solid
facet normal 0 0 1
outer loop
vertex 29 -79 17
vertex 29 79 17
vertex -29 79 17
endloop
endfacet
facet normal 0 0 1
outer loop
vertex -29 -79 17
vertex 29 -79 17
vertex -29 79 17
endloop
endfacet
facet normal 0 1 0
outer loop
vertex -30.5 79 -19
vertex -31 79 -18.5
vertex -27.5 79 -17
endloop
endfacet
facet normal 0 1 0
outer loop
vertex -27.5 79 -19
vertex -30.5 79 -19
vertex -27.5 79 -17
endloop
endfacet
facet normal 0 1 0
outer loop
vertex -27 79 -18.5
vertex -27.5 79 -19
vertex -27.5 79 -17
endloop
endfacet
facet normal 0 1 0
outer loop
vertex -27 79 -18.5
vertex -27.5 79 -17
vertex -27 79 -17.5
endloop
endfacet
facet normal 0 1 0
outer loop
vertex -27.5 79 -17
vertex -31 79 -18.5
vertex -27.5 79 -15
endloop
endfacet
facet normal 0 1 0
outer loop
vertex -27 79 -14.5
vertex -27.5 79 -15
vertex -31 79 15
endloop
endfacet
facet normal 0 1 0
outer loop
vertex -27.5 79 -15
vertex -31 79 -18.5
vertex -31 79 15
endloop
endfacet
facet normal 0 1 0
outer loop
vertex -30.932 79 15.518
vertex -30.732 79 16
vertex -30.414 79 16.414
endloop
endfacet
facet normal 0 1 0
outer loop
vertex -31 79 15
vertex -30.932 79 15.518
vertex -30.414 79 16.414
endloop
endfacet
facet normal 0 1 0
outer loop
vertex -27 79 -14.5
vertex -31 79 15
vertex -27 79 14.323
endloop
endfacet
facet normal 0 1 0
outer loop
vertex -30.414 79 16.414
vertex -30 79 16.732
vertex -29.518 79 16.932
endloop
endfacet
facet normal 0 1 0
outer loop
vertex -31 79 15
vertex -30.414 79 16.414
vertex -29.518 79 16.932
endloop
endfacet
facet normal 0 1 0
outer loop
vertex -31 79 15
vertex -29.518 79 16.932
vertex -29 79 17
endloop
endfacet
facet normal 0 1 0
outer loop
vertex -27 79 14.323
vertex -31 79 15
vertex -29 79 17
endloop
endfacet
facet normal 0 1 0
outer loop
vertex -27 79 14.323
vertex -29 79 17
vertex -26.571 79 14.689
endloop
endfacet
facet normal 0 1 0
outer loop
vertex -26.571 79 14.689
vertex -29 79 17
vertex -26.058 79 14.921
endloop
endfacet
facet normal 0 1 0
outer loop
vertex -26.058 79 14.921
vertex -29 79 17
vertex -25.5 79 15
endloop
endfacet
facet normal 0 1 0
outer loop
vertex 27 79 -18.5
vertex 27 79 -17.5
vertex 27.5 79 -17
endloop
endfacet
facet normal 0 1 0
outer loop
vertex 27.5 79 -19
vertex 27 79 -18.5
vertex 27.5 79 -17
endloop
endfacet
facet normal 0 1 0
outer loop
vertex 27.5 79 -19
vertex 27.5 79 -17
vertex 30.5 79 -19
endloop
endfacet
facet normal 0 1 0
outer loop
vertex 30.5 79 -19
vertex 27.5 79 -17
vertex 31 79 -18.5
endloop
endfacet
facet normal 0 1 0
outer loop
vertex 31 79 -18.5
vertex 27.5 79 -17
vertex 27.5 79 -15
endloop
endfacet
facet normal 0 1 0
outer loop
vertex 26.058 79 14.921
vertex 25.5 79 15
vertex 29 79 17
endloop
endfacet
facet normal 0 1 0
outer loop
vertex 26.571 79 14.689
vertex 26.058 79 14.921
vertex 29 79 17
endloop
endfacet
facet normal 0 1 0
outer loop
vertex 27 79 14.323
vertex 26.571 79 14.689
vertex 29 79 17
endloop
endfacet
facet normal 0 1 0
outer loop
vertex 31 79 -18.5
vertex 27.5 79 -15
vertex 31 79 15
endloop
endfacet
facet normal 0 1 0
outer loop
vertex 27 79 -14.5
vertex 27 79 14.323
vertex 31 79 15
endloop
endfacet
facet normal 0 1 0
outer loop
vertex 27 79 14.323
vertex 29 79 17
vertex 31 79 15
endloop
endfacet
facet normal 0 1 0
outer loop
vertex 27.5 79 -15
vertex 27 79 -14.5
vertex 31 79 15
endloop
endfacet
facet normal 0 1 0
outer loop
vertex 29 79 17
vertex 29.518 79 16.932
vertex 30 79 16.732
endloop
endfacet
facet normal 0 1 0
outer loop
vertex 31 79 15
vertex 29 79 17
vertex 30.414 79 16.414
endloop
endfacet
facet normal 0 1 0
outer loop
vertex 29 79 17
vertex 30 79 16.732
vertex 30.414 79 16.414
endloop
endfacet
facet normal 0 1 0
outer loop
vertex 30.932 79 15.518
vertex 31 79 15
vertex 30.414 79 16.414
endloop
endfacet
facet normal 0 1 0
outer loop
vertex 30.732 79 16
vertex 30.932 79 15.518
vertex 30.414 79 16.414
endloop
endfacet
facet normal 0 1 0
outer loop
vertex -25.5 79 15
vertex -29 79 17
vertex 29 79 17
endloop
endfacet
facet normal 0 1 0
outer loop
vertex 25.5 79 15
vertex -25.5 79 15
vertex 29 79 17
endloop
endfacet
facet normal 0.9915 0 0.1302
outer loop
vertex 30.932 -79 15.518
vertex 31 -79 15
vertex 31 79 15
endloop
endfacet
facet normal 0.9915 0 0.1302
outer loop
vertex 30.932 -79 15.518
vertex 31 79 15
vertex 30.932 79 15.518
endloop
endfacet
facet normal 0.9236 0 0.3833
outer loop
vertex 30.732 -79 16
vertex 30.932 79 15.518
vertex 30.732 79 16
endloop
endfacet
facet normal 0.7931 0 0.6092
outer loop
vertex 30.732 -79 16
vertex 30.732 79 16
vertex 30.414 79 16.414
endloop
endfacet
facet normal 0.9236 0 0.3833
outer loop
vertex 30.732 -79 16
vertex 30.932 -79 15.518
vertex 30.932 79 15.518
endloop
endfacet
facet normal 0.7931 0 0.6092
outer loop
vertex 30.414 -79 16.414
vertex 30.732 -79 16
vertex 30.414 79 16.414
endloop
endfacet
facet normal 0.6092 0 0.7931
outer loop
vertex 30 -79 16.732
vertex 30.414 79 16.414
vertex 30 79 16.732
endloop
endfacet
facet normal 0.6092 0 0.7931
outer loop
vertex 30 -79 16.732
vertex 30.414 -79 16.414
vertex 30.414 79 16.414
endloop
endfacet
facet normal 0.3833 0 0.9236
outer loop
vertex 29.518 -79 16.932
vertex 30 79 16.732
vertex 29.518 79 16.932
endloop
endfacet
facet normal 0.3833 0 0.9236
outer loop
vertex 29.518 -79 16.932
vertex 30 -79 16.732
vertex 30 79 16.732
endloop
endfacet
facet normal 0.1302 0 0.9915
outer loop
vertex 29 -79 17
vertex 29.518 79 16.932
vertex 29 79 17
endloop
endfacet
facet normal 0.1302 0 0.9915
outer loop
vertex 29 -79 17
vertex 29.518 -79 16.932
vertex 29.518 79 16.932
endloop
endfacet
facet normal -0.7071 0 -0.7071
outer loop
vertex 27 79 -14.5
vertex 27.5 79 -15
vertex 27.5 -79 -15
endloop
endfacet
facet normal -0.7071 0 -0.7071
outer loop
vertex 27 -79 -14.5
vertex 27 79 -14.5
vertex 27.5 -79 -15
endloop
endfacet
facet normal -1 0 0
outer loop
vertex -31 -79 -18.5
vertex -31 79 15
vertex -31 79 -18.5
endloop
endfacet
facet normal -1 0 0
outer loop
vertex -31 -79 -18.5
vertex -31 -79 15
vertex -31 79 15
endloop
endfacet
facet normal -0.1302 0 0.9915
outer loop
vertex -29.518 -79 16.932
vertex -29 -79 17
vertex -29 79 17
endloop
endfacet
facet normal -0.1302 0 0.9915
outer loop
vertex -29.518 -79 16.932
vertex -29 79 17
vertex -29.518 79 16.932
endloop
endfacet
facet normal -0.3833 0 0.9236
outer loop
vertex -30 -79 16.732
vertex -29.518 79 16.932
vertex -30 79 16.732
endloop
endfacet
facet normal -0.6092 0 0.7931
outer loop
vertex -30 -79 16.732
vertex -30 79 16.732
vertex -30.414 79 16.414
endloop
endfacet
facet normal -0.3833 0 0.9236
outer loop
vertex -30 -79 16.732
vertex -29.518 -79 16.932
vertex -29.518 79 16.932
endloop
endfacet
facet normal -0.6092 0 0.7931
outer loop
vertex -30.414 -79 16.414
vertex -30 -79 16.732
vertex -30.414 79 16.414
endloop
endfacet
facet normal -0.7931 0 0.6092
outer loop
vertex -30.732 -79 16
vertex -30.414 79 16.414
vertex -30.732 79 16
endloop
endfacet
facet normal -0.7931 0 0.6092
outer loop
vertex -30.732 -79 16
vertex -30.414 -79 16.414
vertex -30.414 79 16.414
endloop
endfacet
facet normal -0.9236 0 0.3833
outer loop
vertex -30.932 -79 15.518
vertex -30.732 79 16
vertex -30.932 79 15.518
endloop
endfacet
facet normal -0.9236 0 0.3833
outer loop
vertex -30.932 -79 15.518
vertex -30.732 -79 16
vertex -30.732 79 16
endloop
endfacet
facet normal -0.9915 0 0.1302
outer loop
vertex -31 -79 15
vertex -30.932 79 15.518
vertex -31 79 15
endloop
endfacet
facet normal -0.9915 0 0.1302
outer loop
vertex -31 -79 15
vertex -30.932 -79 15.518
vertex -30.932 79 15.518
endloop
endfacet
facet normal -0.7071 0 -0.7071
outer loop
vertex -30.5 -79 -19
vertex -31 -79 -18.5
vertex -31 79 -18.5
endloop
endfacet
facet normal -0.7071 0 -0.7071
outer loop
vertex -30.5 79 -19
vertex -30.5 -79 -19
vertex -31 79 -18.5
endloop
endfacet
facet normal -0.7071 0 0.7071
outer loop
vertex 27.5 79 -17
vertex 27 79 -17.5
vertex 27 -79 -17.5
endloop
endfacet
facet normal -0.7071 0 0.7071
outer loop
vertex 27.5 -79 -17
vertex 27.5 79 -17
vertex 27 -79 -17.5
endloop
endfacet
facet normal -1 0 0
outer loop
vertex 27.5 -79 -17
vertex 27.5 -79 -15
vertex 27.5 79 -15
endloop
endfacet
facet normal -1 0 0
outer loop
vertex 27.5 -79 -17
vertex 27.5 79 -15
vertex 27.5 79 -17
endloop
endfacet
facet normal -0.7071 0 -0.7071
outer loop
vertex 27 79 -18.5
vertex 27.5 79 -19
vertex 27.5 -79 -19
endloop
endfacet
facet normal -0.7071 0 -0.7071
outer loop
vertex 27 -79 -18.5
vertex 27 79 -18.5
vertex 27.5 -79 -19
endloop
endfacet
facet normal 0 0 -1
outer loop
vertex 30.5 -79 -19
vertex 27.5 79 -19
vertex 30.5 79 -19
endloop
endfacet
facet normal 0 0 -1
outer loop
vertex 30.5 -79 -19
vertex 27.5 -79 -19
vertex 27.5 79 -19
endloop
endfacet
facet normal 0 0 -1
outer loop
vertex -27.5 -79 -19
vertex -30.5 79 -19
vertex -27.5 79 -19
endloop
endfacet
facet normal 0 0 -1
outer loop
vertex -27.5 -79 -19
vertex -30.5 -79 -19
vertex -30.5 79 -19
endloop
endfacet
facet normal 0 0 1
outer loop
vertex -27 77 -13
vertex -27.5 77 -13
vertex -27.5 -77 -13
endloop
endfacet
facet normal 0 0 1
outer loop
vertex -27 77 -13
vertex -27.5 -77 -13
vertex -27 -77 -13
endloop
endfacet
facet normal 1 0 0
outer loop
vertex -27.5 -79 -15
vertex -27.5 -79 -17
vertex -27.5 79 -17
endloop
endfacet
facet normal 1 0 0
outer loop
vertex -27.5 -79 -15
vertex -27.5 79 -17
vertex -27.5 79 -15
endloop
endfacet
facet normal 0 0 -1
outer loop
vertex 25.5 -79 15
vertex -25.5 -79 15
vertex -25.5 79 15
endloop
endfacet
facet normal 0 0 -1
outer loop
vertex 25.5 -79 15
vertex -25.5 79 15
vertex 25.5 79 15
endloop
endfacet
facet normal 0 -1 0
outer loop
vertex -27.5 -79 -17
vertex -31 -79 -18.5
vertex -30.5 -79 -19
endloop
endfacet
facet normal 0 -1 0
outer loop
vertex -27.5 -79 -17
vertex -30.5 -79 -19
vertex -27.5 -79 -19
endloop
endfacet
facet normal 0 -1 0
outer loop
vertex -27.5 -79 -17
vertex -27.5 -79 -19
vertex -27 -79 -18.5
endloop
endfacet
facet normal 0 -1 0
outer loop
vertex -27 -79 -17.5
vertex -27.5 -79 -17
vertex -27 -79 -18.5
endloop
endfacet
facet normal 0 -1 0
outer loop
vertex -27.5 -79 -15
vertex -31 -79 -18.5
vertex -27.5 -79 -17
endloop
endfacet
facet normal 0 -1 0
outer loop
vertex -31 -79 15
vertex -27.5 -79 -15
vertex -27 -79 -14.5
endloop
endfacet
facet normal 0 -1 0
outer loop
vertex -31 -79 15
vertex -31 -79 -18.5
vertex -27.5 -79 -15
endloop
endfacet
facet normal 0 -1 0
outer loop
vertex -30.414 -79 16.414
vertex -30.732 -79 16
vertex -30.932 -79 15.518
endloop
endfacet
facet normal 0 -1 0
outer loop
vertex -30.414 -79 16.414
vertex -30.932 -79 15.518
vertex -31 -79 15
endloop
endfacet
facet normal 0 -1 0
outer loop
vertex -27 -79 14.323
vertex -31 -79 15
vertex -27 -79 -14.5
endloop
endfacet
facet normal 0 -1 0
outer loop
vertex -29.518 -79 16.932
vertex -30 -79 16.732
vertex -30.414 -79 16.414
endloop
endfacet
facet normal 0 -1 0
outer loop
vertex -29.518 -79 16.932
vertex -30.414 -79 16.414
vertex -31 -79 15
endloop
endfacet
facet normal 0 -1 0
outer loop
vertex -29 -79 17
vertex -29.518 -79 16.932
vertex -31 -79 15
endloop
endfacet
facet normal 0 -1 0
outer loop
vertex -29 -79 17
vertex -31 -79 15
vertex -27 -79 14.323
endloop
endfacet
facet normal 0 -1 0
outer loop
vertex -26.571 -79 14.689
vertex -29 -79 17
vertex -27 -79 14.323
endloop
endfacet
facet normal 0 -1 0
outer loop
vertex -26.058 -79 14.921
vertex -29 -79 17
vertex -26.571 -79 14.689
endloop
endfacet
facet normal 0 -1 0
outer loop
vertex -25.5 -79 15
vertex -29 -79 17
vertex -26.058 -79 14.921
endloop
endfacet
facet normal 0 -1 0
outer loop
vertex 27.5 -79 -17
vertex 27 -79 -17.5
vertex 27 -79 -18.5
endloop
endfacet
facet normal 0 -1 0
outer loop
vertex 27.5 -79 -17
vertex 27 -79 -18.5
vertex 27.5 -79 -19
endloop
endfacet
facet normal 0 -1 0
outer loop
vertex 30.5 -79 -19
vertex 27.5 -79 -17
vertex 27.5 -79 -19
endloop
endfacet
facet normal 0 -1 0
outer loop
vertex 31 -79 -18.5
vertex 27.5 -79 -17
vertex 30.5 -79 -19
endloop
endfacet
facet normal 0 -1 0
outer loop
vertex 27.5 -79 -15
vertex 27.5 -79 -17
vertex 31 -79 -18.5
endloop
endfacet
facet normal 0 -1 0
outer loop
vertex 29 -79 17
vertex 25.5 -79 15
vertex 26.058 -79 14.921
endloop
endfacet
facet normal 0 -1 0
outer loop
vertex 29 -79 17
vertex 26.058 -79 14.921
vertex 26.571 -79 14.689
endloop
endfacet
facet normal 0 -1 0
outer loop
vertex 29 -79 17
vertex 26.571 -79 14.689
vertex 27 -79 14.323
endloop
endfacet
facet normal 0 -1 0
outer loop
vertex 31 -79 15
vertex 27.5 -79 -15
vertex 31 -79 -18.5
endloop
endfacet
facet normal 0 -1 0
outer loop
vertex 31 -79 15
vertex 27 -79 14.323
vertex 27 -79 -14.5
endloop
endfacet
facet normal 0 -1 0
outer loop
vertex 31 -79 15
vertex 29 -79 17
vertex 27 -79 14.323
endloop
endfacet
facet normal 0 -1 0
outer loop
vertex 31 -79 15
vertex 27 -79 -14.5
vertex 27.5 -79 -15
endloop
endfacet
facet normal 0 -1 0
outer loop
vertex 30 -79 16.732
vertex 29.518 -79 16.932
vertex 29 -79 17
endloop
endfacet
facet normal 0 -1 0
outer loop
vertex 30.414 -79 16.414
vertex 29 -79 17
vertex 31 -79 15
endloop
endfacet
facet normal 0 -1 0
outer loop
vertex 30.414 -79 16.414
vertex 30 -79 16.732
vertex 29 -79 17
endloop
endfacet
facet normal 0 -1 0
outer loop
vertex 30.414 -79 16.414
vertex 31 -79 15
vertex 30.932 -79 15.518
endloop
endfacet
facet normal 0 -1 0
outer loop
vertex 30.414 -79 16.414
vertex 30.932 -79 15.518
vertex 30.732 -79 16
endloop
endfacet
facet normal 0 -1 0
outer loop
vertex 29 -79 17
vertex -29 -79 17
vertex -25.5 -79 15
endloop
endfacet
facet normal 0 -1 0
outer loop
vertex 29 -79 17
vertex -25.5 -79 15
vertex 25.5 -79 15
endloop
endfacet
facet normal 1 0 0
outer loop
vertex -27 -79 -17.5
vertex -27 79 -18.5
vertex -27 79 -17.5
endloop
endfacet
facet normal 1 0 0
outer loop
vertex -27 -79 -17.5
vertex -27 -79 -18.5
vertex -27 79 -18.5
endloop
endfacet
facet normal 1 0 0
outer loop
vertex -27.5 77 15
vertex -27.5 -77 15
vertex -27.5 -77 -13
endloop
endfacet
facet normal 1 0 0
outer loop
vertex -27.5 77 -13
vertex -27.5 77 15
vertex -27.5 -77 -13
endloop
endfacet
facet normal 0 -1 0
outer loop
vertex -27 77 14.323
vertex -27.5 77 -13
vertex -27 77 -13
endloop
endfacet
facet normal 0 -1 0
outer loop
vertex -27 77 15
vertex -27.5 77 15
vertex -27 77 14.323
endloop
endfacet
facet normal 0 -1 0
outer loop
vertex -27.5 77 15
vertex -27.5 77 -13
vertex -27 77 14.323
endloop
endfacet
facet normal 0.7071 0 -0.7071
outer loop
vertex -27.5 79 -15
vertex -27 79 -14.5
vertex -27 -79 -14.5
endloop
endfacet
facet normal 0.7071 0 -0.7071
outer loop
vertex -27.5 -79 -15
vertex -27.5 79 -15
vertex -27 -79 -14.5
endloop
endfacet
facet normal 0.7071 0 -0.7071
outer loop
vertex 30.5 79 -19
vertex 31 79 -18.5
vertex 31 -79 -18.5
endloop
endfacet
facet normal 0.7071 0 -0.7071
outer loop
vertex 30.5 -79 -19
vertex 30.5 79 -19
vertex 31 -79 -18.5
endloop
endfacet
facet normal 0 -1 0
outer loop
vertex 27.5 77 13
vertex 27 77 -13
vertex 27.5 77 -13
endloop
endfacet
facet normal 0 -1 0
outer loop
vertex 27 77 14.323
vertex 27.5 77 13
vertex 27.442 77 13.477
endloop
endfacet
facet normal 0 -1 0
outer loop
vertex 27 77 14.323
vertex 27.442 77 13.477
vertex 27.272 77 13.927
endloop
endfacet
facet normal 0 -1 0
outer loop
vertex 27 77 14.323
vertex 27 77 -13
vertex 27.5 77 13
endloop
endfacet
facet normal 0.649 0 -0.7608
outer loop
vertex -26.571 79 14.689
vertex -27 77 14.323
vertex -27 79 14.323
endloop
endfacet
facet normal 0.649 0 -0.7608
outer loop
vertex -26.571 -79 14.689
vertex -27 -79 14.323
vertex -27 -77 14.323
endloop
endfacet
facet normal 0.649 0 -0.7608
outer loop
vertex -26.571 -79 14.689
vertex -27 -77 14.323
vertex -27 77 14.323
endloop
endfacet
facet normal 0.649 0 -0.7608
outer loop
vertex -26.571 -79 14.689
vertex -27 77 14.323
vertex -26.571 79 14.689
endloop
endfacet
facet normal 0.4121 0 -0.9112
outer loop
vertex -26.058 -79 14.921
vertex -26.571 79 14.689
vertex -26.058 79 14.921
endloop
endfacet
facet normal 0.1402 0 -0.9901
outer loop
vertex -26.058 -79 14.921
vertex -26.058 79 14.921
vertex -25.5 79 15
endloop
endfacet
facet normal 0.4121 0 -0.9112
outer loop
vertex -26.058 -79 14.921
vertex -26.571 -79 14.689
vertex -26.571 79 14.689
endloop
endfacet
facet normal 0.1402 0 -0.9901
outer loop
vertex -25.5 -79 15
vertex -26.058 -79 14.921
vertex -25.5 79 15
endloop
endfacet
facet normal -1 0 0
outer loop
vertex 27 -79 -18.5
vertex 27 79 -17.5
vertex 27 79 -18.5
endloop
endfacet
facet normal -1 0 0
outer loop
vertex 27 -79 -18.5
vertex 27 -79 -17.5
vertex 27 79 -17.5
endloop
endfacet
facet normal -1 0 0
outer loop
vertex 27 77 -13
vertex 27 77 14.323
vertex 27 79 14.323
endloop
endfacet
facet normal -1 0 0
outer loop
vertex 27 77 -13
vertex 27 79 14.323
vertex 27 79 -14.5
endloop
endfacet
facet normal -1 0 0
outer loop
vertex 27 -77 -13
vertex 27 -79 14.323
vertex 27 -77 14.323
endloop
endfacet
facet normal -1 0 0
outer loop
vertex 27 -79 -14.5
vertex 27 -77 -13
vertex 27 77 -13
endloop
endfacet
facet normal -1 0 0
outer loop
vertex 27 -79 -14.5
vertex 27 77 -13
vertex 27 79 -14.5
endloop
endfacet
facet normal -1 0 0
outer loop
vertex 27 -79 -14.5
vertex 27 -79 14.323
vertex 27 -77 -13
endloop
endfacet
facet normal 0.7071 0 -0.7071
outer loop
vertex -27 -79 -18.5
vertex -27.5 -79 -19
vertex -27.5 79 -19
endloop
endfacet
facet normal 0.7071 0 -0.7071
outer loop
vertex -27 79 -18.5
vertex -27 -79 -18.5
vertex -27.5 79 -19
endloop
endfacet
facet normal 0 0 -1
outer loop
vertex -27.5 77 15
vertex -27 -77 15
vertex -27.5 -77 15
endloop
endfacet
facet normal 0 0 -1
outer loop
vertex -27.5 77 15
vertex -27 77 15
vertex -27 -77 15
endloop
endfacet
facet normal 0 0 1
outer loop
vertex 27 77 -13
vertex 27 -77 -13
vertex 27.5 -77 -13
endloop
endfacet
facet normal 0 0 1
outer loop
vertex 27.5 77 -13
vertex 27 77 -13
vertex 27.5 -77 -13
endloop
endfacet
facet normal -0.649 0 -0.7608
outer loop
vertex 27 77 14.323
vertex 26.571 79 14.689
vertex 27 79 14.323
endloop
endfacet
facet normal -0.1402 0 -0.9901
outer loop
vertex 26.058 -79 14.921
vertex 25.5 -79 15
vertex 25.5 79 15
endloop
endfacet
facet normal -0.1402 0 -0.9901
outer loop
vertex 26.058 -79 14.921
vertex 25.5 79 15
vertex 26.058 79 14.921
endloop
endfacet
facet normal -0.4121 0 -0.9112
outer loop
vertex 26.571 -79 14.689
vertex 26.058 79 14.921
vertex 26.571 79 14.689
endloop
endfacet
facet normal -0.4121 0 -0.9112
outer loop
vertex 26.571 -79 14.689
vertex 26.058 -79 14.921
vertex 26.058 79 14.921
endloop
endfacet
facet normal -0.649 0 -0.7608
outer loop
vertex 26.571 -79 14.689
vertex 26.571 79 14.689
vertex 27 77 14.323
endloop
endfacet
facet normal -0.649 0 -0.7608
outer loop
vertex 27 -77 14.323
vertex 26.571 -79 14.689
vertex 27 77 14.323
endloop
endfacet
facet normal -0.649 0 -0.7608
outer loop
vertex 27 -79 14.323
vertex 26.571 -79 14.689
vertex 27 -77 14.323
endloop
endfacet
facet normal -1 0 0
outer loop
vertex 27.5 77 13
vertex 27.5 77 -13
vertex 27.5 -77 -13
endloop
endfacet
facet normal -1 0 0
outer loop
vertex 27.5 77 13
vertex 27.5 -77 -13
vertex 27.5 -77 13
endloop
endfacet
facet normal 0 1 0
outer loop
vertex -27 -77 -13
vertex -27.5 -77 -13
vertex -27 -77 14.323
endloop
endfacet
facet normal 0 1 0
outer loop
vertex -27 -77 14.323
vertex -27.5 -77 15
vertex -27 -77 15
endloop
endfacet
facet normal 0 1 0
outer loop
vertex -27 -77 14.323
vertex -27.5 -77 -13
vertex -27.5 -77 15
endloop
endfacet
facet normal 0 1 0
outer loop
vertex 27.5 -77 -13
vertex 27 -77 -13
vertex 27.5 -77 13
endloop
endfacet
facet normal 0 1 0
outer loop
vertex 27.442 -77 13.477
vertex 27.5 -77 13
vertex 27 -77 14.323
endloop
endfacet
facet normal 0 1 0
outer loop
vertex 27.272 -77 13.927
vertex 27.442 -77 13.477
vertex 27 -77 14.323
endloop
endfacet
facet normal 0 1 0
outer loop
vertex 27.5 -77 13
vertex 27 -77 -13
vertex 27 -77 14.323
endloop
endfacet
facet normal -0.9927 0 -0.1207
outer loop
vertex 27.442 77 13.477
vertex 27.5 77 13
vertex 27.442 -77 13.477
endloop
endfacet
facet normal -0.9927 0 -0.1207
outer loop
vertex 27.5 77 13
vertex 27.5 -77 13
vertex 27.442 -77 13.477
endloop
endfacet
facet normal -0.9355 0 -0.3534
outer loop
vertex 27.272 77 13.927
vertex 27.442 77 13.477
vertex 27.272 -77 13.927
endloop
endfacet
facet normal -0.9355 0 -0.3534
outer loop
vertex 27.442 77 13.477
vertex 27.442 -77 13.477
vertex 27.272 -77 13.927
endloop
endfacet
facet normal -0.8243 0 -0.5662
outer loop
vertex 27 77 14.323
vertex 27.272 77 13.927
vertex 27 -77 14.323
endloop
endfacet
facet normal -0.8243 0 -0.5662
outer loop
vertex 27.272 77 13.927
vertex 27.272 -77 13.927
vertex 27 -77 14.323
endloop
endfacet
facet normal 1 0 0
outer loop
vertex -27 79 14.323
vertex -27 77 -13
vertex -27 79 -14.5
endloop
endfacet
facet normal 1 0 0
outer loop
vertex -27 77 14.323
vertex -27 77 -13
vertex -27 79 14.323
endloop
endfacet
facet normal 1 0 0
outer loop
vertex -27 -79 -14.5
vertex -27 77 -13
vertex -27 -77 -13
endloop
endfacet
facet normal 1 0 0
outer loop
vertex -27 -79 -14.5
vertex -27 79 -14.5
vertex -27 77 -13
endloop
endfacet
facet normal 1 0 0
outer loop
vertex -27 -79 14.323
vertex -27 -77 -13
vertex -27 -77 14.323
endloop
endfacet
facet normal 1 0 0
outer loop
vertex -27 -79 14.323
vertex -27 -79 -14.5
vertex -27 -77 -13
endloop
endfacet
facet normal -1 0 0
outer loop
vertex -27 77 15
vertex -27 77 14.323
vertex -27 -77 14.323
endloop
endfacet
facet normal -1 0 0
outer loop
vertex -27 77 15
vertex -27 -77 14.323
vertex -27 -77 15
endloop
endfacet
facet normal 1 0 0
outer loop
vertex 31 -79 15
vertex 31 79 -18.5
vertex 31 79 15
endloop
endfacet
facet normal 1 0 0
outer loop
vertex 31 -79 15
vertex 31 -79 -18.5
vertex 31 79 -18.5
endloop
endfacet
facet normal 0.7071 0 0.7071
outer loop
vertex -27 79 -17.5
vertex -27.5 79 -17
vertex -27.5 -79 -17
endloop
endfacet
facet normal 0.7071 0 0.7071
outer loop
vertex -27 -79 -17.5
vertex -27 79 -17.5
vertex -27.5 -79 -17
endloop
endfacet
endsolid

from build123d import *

# Parameters (mm, degrees)
F2_W     = 0.5
F2_H     = 2
F3_DEPTH = 79
F4_DEPTH = 77
F5_SIZE  = 0.49999


# Not quite as in the source:
# - a fillet or chamfer is up to 0.001 mm smaller than in the source, because OpenCascade refuses the exact size


with BuildPart() as f3:
    # F2 (on Front) → F3 (new body, symmetric)
    with BuildSketch(Plane.XZ):
        with BuildLine():
            Line((-27, -19), (-27, -17))
            Line((-27, -17), (-27.5, -17))
            Line((-27.5, -17), (-27.5, -15))
            Line((-27.5, -15), (-27.5, -13))
            Line((-27.5, -13), (-27.5, 13))
            Line((-27.5, 13), (-27.5, 15))
            Line((-27.5, 15), (-27, 15))
            Line((-27, 15), (-25.5, 15))
            Line((-25.5, 15), (0, 15))
            Line((0, 15), (25.5, 15))
            Line((25.5, 15), (27, 15))
            Line((27, 15), (27.5, 15))
            Line((27.5, 15), (27.5, 13))
            Line((27.5, 13), (27.5, -13))
            Line((27.5, -13), (27.5, -15))
            Line((27.5, -15), (27.5, -17))
            Line((27.5, -17), (27, -17))
            Line((27, -17), (27, -19))
            Line((27, -19), (31, -19))
            Line((31, -19), (31, 15))
            ThreePointArc((31, 15), (30.4142135624, 16.4142135624), (29, 17))
            Line((29, 17), (0, 17))
            Line((0, 17), (-29, 17))
            ThreePointArc((-29, 17), (-30.4142135624, 16.4142135624), (-31, 15))
            Line((-31, 15), (-31, -19))
            Line((-31, -19), (-27, -19))
        make_face()
        with Locations((-27.25, -14)):
            Rectangle(F2_W, F2_H)
        with BuildLine():
            Line((-27.5, 13), (-27.5, -13))
            Line((-27.5, -13), (-27, -13))
            Line((-27, -13), (-27, 14.3228756555))
            ThreePointArc((-27, 14.3228756555), (-27.3708286934, 13.7071067812), (-27.5, 13))
        make_face()
        with BuildLine():
            Line((-27.5, 15), (-27.5, 13))
            ThreePointArc((-27.5, 13), (-27.3708286934, 13.7071067812), (-27, 14.3228756555))
            Line((-27, 14.3228756555), (-27, 15))
            Line((-27, 15), (-27.5, 15))
        make_face()
        with BuildLine():
            Line((-27, 15), (-27, 14.3228756555))
            ThreePointArc((-27, 14.3228756555), (-26.3228756555, 14.8228756555), (-25.5, 15))
            Line((-25.5, 15), (-27, 15))
        make_face()
        with BuildLine():
            Line((27, 15), (25.5, 15))
            ThreePointArc((25.5, 15), (26.3228756555, 14.8228756555), (27, 14.3228756555))
            Line((27, 14.3228756555), (27, 15))
        make_face()
        with BuildLine():
            Line((27.5, 15), (27, 15))
            Line((27, 15), (27, 14.3228756555))
            ThreePointArc((27, 14.3228756555), (27.3708286934, 13.7071067812), (27.5, 13))
            Line((27.5, 13), (27.5, 15))
        make_face()
        with BuildLine():
            ThreePointArc((27.5, 13), (27.3708286934, 13.7071067812), (27, 14.3228756555))
            Line((27, 14.3228756555), (27, -13))
            Line((27, -13), (27.5, -13))
            Line((27.5, -13), (27.5, 13))
        make_face()
        with Locations((27.25, -14)):
            Rectangle(F2_W, F2_H)
    extrude(amount=F3_DEPTH, both=True)

    # F2 (on Front) → F4 (cut, symmetric)
    with BuildSketch(Plane.XZ):
        with BuildLine():
            Line((-27.5, 13), (-27.5, -13))
            Line((-27.5, -13), (-27, -13))
            Line((-27, -13), (-27, 14.3228756555))
            ThreePointArc((-27, 14.3228756555), (-27.3708286934, 13.7071067812), (-27.5, 13))
        make_face()
        with BuildLine():
            Line((-27.5, 15), (-27.5, 13))
            ThreePointArc((-27.5, 13), (-27.3708286934, 13.7071067812), (-27, 14.3228756555))
            Line((-27, 14.3228756555), (-27, 15))
            Line((-27, 15), (-27.5, 15))
        make_face()
        with BuildLine():
            ThreePointArc((27.5, 13), (27.3708286934, 13.7071067812), (27, 14.3228756555))
            Line((27, 14.3228756555), (27, -13))
            Line((27, -13), (27.5, -13))
            Line((27.5, -13), (27.5, 13))
        make_face()
    extrude(amount=F4_DEPTH, both=True, mode=Mode.SUBTRACT)

    # F5 (size 0.5 in the source; OpenCascade refuses exactly that, so slightly less here)
    f5_edges = [f3.edges().sort_by_distance(p)[0] for p in [
        (-27, 0, -17),
        (-27, 0, -15),
        (27, 0, -15),
        (27, 0, -17),
        (-27, 0, -19),
        (27, 0, -19),
        (-31, 0, -19),
        (31, 0, -19),
    ]]
    chamfer(f5_edges, length=F5_SIZE)


solid = f3.part
